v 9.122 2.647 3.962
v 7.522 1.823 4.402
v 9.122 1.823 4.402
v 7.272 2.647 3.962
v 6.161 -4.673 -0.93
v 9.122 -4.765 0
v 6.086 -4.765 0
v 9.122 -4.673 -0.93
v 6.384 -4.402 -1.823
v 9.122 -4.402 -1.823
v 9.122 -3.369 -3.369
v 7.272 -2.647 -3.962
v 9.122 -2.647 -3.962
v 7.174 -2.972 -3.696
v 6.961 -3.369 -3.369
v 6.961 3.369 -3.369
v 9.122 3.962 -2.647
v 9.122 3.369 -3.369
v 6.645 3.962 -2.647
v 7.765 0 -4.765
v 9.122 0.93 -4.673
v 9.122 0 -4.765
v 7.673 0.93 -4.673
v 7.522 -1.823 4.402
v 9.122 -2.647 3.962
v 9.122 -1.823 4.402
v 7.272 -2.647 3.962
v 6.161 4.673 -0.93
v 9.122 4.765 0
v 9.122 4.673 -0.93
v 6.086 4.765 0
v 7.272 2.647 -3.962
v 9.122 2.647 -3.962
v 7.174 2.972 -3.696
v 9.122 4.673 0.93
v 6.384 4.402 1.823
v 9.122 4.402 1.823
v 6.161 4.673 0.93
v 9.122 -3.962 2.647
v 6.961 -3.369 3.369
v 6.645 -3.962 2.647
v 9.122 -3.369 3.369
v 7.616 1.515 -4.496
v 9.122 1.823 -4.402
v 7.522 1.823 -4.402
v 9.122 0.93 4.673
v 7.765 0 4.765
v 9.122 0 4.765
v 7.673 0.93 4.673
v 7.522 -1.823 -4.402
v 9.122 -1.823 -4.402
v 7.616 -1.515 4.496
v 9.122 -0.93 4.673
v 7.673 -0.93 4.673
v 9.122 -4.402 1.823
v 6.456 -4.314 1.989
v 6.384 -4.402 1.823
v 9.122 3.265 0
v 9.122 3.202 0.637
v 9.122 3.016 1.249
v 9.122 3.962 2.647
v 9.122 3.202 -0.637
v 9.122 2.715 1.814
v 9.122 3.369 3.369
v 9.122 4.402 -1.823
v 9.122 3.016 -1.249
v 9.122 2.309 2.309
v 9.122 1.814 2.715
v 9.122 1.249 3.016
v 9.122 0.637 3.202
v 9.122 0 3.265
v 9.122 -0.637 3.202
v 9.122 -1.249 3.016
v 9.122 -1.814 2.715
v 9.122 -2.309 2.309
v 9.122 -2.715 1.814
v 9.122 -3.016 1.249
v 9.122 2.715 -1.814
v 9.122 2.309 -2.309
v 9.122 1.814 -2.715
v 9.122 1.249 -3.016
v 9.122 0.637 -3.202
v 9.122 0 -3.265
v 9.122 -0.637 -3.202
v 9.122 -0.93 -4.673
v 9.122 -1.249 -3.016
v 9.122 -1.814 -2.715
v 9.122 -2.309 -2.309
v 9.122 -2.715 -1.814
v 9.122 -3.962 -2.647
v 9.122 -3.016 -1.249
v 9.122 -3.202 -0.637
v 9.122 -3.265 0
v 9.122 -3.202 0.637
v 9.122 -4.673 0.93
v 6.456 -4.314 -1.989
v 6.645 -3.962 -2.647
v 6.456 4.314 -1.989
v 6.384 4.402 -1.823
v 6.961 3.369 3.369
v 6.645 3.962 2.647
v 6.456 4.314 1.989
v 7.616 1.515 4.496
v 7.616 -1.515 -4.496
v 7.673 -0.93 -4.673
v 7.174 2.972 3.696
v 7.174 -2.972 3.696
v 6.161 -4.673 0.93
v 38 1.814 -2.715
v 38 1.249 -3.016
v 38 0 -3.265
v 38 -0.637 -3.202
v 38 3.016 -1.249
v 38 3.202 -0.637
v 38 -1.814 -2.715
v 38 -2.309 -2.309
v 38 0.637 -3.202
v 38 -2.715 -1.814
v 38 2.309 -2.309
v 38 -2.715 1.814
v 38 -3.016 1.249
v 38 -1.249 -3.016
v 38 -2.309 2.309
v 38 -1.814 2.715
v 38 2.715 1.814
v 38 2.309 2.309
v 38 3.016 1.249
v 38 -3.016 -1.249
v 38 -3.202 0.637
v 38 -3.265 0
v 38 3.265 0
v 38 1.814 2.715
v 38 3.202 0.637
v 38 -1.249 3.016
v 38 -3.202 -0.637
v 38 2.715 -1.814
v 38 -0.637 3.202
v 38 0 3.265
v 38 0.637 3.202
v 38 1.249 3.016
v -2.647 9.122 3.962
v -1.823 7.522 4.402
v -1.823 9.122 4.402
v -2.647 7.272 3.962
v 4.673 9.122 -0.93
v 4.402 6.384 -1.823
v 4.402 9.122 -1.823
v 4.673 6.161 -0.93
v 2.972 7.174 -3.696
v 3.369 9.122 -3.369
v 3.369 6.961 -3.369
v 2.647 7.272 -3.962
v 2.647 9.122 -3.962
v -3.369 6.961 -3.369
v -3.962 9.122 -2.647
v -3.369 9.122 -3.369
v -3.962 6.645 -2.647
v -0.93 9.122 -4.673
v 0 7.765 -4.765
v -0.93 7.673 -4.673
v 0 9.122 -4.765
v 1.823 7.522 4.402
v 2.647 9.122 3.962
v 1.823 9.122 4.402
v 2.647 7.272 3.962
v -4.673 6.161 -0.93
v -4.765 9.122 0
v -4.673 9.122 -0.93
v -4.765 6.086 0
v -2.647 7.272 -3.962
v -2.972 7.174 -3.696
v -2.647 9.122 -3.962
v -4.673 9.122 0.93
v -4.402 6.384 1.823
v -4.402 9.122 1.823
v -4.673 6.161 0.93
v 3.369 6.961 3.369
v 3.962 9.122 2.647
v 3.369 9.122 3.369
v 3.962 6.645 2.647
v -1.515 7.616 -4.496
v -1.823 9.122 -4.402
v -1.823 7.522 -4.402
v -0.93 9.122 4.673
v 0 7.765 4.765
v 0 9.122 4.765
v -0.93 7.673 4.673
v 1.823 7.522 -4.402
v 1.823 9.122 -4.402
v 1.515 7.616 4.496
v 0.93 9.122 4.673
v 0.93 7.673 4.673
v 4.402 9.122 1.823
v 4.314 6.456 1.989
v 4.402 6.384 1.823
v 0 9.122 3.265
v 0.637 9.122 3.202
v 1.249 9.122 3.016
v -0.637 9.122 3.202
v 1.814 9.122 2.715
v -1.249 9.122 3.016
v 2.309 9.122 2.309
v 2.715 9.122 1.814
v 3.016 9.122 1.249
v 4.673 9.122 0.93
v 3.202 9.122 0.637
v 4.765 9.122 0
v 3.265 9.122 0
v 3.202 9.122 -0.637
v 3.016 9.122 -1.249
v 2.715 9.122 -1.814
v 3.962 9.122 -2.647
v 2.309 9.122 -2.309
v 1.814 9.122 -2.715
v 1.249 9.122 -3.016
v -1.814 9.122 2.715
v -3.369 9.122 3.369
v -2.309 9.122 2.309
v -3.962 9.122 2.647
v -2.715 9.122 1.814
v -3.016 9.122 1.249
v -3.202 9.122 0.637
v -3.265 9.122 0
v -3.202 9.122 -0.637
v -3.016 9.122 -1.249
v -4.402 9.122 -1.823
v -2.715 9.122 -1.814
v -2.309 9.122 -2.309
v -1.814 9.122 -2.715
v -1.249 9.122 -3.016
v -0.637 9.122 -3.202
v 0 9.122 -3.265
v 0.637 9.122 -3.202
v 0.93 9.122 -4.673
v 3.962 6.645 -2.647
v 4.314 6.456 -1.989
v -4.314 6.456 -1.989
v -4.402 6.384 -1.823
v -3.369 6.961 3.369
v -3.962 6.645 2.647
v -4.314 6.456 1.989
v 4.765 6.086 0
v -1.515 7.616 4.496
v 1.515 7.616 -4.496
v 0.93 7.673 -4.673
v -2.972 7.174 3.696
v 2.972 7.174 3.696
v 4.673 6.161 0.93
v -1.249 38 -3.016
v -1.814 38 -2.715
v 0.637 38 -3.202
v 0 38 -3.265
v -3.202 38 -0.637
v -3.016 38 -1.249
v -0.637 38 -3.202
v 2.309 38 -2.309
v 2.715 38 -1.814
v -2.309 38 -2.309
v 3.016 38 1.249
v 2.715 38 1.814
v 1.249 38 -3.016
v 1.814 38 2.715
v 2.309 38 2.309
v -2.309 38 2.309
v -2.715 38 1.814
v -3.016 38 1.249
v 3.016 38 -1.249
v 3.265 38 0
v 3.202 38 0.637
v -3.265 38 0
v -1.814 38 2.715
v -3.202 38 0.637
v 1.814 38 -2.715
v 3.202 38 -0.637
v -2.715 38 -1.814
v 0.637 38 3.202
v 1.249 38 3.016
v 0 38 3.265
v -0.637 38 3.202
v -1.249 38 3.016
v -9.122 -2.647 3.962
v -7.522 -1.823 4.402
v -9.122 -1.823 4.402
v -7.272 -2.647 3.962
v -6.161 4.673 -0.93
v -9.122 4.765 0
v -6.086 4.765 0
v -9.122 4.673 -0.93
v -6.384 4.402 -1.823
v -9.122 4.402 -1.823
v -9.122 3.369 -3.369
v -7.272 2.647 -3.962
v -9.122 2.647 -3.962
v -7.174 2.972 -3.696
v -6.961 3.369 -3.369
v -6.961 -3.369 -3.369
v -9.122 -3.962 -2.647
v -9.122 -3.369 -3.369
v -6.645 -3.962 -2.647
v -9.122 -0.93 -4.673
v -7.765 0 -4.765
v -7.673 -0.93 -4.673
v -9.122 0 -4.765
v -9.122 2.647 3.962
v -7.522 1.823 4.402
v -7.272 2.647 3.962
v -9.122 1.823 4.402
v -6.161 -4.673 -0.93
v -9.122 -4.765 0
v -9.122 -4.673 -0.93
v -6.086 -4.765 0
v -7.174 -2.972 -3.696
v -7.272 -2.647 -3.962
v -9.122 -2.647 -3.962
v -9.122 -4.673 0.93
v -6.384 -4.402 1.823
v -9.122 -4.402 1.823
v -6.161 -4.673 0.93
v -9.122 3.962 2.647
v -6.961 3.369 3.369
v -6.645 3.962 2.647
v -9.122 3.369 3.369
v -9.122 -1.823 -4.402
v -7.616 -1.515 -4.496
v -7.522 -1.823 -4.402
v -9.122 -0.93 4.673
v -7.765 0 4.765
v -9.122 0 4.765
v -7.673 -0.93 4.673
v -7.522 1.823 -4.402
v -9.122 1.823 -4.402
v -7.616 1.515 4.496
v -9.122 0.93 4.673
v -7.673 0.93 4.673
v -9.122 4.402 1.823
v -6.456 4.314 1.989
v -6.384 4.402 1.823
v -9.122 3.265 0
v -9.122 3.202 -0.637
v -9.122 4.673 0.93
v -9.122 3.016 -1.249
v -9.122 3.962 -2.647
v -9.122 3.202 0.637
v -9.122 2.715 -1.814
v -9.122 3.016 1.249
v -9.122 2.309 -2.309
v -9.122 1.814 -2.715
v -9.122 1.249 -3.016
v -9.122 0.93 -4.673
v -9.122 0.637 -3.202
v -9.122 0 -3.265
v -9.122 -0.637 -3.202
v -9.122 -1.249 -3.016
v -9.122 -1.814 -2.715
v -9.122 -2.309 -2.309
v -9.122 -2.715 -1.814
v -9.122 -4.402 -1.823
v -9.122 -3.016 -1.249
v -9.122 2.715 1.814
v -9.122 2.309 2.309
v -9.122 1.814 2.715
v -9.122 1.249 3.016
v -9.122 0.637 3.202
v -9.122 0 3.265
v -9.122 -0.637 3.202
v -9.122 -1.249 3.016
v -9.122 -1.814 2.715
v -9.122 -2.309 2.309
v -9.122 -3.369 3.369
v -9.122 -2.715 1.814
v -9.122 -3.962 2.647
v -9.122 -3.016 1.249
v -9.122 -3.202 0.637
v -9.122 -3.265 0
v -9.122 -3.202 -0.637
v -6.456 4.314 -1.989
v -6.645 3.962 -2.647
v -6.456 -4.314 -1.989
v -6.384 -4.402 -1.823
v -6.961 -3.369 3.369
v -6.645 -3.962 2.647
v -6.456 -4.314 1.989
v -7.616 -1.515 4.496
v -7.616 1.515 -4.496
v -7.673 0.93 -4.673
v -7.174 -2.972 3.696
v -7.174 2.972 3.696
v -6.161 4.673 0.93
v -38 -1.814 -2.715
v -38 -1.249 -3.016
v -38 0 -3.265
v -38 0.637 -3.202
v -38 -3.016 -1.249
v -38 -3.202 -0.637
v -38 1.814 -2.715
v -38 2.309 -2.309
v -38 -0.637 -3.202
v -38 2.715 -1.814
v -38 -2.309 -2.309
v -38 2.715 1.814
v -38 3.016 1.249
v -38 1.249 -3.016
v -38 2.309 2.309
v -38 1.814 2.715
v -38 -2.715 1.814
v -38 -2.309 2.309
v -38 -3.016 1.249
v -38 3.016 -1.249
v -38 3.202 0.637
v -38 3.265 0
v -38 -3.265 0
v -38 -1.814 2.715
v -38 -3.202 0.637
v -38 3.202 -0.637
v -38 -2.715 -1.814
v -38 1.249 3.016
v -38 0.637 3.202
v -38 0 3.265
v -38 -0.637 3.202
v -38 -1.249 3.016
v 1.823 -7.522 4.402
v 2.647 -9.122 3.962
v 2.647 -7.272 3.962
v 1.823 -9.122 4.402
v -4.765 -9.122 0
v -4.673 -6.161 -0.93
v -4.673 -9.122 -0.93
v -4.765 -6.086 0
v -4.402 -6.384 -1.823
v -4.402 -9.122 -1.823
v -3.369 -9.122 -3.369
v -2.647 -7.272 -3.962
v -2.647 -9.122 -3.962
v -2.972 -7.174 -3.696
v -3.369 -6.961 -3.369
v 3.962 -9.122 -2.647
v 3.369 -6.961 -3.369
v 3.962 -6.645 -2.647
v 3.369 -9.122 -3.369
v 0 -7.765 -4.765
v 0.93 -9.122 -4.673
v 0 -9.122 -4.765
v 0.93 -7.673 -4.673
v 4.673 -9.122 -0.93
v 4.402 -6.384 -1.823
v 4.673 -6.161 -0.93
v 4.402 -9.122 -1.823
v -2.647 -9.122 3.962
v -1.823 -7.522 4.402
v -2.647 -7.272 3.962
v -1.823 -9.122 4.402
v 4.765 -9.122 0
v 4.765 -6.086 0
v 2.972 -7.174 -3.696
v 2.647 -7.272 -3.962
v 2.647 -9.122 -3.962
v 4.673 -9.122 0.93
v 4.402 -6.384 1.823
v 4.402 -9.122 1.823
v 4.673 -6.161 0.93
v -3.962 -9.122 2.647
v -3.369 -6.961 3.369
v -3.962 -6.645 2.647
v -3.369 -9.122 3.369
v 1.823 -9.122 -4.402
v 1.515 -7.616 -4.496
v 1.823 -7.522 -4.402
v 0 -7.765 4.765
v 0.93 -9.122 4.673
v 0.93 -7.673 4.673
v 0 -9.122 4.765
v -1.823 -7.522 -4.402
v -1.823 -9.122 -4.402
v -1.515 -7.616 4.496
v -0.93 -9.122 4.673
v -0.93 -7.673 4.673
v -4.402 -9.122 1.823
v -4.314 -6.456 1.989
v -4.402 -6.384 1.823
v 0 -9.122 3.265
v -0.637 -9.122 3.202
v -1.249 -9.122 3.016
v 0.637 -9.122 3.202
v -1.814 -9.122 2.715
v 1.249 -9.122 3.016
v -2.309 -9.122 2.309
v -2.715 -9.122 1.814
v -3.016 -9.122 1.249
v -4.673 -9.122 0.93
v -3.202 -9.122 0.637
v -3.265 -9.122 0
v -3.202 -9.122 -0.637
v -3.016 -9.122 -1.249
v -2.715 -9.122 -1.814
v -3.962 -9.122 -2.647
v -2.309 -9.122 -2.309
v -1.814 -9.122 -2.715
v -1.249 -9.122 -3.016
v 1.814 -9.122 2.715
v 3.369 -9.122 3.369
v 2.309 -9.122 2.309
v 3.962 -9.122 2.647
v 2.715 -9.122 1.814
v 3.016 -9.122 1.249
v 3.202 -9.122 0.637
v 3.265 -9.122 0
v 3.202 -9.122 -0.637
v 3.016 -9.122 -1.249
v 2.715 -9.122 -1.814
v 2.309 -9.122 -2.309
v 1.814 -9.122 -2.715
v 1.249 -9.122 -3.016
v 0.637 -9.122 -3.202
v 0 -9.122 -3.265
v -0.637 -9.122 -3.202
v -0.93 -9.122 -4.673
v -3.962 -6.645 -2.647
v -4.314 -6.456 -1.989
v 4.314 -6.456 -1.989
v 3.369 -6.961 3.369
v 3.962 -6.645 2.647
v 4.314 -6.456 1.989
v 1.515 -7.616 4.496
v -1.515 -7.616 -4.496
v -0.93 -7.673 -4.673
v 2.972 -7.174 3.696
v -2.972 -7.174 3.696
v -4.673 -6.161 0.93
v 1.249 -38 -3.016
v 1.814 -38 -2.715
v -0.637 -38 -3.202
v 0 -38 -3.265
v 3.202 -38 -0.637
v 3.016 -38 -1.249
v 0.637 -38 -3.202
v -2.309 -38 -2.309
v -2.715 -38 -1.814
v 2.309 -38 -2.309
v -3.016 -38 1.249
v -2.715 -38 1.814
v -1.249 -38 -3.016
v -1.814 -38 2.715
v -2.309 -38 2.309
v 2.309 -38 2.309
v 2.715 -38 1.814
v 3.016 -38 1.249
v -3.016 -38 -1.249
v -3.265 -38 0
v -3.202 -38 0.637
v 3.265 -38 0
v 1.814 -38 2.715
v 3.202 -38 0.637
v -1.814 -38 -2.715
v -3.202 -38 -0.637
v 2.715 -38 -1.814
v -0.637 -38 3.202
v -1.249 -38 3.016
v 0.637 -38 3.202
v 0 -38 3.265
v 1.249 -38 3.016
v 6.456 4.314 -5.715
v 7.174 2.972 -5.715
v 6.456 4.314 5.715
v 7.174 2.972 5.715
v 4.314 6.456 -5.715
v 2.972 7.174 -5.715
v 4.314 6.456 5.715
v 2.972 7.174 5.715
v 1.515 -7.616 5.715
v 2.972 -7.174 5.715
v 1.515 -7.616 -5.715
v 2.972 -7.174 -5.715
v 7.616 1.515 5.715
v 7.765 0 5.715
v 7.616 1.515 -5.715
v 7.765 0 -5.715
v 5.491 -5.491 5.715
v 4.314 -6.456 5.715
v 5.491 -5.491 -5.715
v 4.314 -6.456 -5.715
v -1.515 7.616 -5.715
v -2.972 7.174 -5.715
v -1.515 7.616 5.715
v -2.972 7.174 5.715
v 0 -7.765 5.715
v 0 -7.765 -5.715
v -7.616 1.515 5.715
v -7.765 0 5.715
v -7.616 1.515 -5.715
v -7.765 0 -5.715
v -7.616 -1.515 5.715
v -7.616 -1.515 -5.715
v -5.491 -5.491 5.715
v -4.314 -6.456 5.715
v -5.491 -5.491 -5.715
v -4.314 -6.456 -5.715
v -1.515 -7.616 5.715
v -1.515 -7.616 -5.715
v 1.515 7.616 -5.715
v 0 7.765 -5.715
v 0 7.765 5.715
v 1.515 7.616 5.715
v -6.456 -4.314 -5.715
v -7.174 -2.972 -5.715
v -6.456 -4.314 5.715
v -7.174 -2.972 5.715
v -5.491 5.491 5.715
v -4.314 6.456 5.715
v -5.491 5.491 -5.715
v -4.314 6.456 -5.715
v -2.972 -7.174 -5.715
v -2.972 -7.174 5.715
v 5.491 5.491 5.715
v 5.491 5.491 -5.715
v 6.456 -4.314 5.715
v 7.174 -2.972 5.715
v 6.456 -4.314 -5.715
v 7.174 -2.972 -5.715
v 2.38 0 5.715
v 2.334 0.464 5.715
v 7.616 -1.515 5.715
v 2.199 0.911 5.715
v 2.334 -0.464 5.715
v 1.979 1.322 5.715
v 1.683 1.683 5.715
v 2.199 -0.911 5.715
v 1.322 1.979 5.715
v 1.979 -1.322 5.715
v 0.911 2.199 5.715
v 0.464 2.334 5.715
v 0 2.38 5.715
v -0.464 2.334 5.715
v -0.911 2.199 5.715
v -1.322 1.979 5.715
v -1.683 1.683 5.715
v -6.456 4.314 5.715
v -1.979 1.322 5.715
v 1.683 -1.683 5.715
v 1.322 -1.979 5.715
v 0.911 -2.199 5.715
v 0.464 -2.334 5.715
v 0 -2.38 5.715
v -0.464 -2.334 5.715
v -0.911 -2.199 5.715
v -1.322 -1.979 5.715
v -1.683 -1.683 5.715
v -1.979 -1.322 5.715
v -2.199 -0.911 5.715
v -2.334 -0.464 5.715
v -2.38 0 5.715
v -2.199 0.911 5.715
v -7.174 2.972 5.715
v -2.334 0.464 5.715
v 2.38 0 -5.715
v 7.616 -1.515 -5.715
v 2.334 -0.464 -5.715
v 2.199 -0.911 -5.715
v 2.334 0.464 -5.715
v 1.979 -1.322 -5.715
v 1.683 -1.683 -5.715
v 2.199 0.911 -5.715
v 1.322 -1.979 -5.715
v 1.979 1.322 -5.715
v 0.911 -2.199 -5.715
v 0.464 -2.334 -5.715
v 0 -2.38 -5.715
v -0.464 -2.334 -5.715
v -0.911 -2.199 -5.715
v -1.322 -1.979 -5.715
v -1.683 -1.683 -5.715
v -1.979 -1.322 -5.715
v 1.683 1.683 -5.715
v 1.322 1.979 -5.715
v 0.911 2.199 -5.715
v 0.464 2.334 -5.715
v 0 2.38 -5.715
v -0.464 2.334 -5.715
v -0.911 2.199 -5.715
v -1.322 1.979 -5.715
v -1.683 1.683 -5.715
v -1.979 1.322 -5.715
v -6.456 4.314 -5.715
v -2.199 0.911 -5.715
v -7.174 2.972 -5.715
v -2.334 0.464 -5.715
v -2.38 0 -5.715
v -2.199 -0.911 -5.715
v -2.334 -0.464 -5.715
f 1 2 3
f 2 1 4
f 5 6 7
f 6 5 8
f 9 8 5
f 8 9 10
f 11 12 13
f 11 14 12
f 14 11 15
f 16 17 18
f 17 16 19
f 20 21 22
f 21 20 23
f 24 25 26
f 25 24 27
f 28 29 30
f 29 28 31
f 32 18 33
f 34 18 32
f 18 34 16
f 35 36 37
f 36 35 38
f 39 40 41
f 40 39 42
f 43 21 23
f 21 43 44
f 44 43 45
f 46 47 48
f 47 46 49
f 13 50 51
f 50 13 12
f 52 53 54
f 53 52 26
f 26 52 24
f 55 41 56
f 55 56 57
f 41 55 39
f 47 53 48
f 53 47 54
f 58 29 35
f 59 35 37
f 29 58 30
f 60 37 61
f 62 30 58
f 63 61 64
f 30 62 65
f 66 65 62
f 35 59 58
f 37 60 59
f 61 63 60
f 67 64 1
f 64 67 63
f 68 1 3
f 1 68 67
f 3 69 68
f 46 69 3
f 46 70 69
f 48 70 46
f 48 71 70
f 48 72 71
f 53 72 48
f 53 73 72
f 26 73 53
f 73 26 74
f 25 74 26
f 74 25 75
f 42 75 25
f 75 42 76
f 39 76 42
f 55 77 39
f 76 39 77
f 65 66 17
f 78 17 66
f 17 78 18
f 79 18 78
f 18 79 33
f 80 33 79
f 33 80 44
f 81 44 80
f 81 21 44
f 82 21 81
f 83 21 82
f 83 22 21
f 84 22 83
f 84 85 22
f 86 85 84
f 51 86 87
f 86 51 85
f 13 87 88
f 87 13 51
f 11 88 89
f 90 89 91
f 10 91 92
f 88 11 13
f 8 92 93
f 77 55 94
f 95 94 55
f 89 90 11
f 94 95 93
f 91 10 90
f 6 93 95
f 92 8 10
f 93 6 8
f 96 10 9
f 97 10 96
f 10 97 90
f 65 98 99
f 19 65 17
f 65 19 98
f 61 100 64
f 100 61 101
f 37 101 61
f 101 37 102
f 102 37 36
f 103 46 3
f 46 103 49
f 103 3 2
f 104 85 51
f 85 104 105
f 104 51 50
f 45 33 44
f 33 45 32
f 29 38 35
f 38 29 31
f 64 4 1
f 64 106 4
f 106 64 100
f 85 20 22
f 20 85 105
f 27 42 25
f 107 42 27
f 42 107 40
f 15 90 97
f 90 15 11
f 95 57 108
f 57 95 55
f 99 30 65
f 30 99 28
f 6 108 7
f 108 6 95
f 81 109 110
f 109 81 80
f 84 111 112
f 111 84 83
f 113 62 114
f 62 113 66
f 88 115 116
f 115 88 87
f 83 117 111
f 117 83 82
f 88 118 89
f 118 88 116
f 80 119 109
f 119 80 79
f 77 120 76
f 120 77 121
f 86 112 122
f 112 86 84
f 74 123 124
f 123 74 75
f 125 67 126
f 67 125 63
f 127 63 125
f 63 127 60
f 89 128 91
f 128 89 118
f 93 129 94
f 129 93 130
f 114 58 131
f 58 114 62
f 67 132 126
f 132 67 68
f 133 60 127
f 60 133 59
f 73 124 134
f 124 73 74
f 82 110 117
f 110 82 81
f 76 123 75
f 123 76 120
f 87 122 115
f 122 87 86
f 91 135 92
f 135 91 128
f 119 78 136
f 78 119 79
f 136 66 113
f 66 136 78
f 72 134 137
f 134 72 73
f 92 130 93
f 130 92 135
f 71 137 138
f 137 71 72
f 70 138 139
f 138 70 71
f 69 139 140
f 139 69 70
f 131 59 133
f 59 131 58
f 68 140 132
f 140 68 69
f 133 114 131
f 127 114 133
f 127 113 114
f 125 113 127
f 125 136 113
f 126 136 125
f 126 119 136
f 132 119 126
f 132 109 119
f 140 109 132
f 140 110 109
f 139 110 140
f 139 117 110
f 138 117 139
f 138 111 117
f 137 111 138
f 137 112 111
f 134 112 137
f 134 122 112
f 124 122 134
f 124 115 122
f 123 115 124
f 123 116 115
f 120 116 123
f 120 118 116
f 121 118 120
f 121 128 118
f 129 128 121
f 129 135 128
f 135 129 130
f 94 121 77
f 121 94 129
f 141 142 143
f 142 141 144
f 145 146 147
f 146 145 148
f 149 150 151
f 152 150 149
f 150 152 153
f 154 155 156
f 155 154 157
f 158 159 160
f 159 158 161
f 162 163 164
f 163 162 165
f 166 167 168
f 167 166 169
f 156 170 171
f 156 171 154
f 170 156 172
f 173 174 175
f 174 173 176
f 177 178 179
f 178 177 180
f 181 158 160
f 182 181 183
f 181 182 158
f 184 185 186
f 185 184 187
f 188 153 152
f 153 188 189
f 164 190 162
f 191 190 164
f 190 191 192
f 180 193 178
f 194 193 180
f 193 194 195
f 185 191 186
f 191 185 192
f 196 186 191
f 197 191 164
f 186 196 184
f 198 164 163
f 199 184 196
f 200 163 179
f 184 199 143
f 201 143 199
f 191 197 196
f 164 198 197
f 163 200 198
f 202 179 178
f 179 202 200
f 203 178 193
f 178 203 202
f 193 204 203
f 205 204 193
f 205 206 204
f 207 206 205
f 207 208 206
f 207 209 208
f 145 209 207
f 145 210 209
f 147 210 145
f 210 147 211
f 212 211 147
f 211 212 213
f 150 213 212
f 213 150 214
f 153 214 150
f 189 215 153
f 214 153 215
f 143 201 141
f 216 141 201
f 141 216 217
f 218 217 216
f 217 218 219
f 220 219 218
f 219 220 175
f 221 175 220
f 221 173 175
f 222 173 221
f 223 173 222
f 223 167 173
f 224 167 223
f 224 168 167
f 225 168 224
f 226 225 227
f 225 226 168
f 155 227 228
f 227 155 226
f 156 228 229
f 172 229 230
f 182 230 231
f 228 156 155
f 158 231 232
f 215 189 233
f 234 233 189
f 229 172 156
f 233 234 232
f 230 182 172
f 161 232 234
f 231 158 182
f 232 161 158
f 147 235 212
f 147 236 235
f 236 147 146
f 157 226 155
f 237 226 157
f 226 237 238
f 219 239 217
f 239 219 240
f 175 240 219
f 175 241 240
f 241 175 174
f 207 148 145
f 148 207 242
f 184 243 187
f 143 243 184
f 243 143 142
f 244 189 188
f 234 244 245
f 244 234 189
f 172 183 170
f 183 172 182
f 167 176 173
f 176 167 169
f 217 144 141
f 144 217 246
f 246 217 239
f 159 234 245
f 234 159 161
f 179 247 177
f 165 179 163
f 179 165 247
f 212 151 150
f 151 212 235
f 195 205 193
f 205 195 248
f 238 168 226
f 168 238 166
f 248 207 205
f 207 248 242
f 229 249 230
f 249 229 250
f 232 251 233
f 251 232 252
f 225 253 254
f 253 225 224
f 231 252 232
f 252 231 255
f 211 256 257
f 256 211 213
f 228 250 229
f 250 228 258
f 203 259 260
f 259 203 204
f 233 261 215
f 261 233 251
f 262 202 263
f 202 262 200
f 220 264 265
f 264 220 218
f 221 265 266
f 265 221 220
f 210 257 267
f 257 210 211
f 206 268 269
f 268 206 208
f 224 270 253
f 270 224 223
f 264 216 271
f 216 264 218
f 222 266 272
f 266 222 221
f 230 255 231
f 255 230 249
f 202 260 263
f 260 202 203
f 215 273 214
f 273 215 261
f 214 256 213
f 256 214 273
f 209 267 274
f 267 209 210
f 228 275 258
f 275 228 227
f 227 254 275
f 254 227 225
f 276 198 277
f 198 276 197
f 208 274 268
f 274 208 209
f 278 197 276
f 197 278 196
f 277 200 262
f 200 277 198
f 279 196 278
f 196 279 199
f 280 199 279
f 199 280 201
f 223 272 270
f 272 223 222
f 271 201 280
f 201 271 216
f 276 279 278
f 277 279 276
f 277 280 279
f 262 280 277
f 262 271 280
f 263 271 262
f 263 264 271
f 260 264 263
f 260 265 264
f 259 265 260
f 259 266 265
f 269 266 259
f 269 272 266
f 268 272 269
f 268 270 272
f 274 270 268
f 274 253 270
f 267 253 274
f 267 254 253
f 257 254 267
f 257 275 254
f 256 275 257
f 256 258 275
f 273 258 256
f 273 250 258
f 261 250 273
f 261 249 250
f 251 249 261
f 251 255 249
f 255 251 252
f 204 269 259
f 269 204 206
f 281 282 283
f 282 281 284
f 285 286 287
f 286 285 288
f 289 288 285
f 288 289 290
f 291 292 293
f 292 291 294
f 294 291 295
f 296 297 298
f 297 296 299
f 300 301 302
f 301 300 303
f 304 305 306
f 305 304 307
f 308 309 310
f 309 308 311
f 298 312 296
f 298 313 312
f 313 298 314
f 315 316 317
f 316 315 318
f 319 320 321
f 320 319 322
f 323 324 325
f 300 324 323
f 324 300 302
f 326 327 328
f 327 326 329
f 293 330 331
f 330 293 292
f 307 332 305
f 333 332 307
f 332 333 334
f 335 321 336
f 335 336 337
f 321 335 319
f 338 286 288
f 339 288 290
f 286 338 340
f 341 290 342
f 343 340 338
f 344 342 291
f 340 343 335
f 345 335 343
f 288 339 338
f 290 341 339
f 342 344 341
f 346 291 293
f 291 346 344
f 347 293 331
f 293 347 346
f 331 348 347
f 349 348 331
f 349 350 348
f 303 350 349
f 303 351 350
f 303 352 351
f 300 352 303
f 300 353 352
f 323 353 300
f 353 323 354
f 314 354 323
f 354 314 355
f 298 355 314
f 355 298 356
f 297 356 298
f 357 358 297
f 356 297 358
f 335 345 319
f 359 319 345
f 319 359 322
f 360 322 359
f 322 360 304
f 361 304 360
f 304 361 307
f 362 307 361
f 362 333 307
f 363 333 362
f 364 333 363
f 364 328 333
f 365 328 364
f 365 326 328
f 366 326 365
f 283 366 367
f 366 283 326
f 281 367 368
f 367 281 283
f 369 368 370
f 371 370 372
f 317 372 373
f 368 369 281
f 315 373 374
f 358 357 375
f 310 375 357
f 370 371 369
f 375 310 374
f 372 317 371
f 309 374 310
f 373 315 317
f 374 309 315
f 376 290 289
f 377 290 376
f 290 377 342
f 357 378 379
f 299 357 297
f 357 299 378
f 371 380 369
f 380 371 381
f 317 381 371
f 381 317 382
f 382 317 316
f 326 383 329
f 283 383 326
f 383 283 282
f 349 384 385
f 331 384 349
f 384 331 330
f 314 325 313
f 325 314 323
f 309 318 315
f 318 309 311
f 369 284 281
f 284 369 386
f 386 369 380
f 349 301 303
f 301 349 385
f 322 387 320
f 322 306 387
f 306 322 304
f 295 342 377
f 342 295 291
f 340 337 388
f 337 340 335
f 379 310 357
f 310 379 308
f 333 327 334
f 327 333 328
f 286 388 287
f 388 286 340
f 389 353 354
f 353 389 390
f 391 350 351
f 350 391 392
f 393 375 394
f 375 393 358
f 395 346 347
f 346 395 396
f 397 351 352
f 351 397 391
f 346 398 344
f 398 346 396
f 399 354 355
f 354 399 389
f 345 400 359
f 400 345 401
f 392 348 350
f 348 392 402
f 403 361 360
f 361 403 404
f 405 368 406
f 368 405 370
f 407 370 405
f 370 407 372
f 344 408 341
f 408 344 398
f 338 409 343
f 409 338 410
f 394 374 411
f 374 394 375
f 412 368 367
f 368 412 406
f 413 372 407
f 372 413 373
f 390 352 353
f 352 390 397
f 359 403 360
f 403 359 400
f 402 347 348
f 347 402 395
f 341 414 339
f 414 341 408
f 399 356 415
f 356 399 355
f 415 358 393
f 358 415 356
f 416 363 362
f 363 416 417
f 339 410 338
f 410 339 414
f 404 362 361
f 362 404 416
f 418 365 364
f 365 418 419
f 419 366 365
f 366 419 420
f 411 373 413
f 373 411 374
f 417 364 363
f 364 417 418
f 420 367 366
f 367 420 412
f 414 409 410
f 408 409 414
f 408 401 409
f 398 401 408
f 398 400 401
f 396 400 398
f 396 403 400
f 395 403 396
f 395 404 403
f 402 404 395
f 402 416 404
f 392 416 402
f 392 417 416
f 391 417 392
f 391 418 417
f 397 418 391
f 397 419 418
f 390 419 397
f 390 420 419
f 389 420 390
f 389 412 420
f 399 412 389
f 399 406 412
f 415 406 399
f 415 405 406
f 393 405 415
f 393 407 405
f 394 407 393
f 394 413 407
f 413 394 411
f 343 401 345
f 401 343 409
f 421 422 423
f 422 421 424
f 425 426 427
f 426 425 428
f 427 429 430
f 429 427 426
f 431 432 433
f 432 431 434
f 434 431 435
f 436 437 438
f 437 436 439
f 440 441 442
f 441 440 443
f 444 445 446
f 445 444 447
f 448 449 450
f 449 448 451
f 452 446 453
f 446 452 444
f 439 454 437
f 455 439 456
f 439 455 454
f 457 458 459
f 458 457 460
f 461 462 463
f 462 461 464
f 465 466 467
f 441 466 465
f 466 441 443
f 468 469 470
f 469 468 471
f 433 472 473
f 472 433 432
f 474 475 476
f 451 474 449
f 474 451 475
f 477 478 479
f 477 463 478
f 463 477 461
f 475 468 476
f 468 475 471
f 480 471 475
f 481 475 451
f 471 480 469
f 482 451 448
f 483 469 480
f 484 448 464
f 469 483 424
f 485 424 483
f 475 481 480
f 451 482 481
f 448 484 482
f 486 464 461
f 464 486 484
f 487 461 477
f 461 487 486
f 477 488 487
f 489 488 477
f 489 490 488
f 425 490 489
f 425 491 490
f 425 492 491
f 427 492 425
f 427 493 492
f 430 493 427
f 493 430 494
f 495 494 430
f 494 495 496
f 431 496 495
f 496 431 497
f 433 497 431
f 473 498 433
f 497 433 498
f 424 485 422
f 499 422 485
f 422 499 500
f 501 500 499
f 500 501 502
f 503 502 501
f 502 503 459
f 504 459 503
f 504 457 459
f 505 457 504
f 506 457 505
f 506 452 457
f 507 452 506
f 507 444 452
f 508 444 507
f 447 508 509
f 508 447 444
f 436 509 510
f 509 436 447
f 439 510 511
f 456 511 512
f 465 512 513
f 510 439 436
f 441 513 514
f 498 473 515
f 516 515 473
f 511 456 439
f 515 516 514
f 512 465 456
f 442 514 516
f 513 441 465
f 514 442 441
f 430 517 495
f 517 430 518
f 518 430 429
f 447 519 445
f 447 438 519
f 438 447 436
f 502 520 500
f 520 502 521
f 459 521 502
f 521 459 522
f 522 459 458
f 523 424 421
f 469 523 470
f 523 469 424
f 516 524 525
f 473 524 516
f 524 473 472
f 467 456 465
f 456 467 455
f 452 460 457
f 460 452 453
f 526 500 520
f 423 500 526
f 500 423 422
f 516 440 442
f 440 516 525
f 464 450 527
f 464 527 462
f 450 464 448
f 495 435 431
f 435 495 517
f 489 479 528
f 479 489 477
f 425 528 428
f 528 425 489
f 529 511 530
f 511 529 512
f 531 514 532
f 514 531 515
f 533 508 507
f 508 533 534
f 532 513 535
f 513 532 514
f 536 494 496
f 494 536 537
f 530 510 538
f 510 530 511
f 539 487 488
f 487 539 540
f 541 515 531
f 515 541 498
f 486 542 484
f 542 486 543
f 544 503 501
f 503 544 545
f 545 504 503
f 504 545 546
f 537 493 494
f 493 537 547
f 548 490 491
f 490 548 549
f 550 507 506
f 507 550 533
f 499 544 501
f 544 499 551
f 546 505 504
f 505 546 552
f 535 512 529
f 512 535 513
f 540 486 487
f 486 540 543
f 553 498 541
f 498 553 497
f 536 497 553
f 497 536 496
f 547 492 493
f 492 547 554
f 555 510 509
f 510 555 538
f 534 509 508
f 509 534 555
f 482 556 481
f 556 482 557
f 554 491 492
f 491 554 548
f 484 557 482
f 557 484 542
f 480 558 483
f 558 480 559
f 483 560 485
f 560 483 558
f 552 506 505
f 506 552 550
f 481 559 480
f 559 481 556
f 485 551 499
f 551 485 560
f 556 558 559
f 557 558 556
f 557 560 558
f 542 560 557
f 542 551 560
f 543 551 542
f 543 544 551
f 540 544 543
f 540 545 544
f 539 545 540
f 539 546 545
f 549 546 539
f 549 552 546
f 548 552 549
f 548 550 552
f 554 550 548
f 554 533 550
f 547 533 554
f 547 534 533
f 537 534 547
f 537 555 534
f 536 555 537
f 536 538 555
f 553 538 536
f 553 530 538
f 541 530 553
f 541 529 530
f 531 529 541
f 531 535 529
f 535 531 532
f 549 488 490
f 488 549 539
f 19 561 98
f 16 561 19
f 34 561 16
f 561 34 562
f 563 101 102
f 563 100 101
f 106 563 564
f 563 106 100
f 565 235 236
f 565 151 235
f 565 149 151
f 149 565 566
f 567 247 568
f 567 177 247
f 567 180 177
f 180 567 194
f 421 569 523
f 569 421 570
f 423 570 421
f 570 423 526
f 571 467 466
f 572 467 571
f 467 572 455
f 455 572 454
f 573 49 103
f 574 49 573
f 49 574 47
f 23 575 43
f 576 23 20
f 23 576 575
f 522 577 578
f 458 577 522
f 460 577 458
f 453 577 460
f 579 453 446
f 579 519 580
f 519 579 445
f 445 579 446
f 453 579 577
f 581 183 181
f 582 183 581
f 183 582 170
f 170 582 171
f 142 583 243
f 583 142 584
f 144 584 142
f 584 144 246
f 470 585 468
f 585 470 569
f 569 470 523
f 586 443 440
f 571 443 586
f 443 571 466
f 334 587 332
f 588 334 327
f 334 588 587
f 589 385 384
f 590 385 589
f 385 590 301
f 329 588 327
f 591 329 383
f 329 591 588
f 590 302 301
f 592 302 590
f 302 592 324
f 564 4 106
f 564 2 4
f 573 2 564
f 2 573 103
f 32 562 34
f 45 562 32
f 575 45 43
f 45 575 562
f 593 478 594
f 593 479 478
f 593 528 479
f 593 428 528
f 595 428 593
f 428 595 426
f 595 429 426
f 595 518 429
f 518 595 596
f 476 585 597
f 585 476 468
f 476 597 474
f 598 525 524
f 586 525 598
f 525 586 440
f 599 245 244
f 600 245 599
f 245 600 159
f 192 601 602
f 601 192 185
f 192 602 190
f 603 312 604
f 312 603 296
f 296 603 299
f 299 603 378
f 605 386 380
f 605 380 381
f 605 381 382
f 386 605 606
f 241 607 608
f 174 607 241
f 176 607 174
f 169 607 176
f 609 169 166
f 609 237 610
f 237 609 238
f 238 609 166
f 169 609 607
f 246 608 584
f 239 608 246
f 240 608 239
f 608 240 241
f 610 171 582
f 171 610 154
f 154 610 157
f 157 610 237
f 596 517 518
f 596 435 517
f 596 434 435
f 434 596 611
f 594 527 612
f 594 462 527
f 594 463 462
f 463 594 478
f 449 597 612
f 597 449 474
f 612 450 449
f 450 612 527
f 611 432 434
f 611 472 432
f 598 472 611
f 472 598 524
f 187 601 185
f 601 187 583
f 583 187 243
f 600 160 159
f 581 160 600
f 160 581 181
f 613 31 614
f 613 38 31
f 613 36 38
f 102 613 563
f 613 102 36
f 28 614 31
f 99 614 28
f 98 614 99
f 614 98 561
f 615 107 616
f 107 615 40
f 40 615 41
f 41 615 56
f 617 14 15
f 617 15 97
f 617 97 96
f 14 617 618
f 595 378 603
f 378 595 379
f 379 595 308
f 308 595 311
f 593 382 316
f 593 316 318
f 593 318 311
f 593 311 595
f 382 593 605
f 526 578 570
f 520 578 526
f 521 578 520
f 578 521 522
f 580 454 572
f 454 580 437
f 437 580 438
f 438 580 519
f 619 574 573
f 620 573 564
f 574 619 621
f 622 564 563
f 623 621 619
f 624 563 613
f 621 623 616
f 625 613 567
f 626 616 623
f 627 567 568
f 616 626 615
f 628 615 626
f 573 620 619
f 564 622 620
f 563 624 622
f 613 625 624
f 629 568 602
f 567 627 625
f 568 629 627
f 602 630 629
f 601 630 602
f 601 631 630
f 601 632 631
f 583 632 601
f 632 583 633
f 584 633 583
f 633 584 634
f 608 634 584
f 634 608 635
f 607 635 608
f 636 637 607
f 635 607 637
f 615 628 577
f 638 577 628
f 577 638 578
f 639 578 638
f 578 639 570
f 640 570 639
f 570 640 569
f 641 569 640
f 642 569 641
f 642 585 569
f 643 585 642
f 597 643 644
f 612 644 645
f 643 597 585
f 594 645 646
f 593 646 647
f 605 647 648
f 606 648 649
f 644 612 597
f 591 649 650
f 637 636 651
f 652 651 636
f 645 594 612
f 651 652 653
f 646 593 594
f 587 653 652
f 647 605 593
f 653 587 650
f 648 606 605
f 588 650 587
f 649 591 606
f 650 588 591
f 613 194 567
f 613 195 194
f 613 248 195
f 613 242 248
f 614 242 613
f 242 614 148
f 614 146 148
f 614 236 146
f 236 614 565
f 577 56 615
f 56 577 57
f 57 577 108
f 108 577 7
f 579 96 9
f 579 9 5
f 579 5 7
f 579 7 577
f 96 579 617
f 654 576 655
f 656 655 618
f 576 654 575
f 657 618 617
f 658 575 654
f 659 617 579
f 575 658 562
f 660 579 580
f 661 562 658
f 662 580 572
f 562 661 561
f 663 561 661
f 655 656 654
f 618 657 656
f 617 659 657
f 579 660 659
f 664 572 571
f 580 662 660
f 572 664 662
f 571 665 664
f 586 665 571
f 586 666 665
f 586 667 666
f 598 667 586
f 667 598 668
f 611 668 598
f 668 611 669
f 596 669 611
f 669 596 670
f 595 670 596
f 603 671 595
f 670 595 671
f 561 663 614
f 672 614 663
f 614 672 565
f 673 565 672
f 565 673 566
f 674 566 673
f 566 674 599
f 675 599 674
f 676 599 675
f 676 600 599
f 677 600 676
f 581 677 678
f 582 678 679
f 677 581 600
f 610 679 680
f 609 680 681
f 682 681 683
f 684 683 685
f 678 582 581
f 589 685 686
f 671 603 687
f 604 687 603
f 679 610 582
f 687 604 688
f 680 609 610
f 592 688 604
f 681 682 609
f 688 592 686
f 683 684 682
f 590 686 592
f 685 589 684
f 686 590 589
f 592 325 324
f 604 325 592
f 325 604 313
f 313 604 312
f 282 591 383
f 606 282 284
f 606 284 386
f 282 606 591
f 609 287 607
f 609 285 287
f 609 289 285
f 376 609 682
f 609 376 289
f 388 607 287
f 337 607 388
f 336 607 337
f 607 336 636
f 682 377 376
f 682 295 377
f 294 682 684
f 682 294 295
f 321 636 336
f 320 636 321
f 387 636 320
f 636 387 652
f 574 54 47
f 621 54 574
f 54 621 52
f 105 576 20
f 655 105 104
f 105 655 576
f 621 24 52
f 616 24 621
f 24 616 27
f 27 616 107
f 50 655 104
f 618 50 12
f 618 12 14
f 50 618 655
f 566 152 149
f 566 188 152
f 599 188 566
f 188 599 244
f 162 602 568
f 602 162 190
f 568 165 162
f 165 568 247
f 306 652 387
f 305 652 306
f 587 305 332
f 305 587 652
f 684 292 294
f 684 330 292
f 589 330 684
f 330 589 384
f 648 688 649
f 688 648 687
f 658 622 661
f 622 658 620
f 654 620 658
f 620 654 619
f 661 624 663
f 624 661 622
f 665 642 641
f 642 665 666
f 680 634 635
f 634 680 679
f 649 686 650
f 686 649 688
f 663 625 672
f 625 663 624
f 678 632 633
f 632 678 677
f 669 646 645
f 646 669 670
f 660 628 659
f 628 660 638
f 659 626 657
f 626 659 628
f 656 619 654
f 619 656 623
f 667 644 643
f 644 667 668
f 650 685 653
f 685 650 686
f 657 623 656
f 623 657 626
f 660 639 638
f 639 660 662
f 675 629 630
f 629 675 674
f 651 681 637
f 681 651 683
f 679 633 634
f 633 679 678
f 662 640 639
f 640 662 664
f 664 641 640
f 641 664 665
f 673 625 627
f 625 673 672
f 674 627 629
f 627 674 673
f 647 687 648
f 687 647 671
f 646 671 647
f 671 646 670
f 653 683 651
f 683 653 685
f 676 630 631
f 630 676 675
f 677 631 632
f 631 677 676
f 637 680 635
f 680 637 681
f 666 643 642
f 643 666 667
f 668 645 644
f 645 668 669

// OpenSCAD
$fn = 32;

// ----------------------------------------------------------------------
// Cardan cross: 76 mm span, 9.53 mm trunnions
// ----------------------------------------------------------------------

// --- parameters (mm) ---
journal_d = 9.53;         // trunnion diameter
arm_len = 38;             // trunnion length from the centre
step_r = 3.24;            // step position from the centre
step_d = 6.53;            // journal diameter after the step
hub_d = 15.53;            // hub diameter
hub_h = 11.43;            // hub height
bore_d = 4.76;            // hub bore

difference() {
  union() {
    /* hub along the joint axis */
    cylinder(h = hub_h, d = hub_d, center = true);
    for (a = [0 : 90 : 270]) rotate([0, 0, a]) {
      /* trunnion, sunk into the hub */
      translate([hub_d / 4, 0, 0]) rotate([0, 90, 0]) cylinder(h = step_r + 2, d = journal_d);
      /* stepped journal out to the tip */
      translate([step_r - 0.5, 0, 0]) rotate([0, 90, 0]) cylinder(h = arm_len + 0.5 - step_r, d = step_d);
    }
  }
  /* lubrication bore through the hub, 2.5 mm clear on both sides */
  translate([0, 0, -hub_h / 2 - 2.5]) cylinder(h = hub_h + 5, d = bore_d);
}
